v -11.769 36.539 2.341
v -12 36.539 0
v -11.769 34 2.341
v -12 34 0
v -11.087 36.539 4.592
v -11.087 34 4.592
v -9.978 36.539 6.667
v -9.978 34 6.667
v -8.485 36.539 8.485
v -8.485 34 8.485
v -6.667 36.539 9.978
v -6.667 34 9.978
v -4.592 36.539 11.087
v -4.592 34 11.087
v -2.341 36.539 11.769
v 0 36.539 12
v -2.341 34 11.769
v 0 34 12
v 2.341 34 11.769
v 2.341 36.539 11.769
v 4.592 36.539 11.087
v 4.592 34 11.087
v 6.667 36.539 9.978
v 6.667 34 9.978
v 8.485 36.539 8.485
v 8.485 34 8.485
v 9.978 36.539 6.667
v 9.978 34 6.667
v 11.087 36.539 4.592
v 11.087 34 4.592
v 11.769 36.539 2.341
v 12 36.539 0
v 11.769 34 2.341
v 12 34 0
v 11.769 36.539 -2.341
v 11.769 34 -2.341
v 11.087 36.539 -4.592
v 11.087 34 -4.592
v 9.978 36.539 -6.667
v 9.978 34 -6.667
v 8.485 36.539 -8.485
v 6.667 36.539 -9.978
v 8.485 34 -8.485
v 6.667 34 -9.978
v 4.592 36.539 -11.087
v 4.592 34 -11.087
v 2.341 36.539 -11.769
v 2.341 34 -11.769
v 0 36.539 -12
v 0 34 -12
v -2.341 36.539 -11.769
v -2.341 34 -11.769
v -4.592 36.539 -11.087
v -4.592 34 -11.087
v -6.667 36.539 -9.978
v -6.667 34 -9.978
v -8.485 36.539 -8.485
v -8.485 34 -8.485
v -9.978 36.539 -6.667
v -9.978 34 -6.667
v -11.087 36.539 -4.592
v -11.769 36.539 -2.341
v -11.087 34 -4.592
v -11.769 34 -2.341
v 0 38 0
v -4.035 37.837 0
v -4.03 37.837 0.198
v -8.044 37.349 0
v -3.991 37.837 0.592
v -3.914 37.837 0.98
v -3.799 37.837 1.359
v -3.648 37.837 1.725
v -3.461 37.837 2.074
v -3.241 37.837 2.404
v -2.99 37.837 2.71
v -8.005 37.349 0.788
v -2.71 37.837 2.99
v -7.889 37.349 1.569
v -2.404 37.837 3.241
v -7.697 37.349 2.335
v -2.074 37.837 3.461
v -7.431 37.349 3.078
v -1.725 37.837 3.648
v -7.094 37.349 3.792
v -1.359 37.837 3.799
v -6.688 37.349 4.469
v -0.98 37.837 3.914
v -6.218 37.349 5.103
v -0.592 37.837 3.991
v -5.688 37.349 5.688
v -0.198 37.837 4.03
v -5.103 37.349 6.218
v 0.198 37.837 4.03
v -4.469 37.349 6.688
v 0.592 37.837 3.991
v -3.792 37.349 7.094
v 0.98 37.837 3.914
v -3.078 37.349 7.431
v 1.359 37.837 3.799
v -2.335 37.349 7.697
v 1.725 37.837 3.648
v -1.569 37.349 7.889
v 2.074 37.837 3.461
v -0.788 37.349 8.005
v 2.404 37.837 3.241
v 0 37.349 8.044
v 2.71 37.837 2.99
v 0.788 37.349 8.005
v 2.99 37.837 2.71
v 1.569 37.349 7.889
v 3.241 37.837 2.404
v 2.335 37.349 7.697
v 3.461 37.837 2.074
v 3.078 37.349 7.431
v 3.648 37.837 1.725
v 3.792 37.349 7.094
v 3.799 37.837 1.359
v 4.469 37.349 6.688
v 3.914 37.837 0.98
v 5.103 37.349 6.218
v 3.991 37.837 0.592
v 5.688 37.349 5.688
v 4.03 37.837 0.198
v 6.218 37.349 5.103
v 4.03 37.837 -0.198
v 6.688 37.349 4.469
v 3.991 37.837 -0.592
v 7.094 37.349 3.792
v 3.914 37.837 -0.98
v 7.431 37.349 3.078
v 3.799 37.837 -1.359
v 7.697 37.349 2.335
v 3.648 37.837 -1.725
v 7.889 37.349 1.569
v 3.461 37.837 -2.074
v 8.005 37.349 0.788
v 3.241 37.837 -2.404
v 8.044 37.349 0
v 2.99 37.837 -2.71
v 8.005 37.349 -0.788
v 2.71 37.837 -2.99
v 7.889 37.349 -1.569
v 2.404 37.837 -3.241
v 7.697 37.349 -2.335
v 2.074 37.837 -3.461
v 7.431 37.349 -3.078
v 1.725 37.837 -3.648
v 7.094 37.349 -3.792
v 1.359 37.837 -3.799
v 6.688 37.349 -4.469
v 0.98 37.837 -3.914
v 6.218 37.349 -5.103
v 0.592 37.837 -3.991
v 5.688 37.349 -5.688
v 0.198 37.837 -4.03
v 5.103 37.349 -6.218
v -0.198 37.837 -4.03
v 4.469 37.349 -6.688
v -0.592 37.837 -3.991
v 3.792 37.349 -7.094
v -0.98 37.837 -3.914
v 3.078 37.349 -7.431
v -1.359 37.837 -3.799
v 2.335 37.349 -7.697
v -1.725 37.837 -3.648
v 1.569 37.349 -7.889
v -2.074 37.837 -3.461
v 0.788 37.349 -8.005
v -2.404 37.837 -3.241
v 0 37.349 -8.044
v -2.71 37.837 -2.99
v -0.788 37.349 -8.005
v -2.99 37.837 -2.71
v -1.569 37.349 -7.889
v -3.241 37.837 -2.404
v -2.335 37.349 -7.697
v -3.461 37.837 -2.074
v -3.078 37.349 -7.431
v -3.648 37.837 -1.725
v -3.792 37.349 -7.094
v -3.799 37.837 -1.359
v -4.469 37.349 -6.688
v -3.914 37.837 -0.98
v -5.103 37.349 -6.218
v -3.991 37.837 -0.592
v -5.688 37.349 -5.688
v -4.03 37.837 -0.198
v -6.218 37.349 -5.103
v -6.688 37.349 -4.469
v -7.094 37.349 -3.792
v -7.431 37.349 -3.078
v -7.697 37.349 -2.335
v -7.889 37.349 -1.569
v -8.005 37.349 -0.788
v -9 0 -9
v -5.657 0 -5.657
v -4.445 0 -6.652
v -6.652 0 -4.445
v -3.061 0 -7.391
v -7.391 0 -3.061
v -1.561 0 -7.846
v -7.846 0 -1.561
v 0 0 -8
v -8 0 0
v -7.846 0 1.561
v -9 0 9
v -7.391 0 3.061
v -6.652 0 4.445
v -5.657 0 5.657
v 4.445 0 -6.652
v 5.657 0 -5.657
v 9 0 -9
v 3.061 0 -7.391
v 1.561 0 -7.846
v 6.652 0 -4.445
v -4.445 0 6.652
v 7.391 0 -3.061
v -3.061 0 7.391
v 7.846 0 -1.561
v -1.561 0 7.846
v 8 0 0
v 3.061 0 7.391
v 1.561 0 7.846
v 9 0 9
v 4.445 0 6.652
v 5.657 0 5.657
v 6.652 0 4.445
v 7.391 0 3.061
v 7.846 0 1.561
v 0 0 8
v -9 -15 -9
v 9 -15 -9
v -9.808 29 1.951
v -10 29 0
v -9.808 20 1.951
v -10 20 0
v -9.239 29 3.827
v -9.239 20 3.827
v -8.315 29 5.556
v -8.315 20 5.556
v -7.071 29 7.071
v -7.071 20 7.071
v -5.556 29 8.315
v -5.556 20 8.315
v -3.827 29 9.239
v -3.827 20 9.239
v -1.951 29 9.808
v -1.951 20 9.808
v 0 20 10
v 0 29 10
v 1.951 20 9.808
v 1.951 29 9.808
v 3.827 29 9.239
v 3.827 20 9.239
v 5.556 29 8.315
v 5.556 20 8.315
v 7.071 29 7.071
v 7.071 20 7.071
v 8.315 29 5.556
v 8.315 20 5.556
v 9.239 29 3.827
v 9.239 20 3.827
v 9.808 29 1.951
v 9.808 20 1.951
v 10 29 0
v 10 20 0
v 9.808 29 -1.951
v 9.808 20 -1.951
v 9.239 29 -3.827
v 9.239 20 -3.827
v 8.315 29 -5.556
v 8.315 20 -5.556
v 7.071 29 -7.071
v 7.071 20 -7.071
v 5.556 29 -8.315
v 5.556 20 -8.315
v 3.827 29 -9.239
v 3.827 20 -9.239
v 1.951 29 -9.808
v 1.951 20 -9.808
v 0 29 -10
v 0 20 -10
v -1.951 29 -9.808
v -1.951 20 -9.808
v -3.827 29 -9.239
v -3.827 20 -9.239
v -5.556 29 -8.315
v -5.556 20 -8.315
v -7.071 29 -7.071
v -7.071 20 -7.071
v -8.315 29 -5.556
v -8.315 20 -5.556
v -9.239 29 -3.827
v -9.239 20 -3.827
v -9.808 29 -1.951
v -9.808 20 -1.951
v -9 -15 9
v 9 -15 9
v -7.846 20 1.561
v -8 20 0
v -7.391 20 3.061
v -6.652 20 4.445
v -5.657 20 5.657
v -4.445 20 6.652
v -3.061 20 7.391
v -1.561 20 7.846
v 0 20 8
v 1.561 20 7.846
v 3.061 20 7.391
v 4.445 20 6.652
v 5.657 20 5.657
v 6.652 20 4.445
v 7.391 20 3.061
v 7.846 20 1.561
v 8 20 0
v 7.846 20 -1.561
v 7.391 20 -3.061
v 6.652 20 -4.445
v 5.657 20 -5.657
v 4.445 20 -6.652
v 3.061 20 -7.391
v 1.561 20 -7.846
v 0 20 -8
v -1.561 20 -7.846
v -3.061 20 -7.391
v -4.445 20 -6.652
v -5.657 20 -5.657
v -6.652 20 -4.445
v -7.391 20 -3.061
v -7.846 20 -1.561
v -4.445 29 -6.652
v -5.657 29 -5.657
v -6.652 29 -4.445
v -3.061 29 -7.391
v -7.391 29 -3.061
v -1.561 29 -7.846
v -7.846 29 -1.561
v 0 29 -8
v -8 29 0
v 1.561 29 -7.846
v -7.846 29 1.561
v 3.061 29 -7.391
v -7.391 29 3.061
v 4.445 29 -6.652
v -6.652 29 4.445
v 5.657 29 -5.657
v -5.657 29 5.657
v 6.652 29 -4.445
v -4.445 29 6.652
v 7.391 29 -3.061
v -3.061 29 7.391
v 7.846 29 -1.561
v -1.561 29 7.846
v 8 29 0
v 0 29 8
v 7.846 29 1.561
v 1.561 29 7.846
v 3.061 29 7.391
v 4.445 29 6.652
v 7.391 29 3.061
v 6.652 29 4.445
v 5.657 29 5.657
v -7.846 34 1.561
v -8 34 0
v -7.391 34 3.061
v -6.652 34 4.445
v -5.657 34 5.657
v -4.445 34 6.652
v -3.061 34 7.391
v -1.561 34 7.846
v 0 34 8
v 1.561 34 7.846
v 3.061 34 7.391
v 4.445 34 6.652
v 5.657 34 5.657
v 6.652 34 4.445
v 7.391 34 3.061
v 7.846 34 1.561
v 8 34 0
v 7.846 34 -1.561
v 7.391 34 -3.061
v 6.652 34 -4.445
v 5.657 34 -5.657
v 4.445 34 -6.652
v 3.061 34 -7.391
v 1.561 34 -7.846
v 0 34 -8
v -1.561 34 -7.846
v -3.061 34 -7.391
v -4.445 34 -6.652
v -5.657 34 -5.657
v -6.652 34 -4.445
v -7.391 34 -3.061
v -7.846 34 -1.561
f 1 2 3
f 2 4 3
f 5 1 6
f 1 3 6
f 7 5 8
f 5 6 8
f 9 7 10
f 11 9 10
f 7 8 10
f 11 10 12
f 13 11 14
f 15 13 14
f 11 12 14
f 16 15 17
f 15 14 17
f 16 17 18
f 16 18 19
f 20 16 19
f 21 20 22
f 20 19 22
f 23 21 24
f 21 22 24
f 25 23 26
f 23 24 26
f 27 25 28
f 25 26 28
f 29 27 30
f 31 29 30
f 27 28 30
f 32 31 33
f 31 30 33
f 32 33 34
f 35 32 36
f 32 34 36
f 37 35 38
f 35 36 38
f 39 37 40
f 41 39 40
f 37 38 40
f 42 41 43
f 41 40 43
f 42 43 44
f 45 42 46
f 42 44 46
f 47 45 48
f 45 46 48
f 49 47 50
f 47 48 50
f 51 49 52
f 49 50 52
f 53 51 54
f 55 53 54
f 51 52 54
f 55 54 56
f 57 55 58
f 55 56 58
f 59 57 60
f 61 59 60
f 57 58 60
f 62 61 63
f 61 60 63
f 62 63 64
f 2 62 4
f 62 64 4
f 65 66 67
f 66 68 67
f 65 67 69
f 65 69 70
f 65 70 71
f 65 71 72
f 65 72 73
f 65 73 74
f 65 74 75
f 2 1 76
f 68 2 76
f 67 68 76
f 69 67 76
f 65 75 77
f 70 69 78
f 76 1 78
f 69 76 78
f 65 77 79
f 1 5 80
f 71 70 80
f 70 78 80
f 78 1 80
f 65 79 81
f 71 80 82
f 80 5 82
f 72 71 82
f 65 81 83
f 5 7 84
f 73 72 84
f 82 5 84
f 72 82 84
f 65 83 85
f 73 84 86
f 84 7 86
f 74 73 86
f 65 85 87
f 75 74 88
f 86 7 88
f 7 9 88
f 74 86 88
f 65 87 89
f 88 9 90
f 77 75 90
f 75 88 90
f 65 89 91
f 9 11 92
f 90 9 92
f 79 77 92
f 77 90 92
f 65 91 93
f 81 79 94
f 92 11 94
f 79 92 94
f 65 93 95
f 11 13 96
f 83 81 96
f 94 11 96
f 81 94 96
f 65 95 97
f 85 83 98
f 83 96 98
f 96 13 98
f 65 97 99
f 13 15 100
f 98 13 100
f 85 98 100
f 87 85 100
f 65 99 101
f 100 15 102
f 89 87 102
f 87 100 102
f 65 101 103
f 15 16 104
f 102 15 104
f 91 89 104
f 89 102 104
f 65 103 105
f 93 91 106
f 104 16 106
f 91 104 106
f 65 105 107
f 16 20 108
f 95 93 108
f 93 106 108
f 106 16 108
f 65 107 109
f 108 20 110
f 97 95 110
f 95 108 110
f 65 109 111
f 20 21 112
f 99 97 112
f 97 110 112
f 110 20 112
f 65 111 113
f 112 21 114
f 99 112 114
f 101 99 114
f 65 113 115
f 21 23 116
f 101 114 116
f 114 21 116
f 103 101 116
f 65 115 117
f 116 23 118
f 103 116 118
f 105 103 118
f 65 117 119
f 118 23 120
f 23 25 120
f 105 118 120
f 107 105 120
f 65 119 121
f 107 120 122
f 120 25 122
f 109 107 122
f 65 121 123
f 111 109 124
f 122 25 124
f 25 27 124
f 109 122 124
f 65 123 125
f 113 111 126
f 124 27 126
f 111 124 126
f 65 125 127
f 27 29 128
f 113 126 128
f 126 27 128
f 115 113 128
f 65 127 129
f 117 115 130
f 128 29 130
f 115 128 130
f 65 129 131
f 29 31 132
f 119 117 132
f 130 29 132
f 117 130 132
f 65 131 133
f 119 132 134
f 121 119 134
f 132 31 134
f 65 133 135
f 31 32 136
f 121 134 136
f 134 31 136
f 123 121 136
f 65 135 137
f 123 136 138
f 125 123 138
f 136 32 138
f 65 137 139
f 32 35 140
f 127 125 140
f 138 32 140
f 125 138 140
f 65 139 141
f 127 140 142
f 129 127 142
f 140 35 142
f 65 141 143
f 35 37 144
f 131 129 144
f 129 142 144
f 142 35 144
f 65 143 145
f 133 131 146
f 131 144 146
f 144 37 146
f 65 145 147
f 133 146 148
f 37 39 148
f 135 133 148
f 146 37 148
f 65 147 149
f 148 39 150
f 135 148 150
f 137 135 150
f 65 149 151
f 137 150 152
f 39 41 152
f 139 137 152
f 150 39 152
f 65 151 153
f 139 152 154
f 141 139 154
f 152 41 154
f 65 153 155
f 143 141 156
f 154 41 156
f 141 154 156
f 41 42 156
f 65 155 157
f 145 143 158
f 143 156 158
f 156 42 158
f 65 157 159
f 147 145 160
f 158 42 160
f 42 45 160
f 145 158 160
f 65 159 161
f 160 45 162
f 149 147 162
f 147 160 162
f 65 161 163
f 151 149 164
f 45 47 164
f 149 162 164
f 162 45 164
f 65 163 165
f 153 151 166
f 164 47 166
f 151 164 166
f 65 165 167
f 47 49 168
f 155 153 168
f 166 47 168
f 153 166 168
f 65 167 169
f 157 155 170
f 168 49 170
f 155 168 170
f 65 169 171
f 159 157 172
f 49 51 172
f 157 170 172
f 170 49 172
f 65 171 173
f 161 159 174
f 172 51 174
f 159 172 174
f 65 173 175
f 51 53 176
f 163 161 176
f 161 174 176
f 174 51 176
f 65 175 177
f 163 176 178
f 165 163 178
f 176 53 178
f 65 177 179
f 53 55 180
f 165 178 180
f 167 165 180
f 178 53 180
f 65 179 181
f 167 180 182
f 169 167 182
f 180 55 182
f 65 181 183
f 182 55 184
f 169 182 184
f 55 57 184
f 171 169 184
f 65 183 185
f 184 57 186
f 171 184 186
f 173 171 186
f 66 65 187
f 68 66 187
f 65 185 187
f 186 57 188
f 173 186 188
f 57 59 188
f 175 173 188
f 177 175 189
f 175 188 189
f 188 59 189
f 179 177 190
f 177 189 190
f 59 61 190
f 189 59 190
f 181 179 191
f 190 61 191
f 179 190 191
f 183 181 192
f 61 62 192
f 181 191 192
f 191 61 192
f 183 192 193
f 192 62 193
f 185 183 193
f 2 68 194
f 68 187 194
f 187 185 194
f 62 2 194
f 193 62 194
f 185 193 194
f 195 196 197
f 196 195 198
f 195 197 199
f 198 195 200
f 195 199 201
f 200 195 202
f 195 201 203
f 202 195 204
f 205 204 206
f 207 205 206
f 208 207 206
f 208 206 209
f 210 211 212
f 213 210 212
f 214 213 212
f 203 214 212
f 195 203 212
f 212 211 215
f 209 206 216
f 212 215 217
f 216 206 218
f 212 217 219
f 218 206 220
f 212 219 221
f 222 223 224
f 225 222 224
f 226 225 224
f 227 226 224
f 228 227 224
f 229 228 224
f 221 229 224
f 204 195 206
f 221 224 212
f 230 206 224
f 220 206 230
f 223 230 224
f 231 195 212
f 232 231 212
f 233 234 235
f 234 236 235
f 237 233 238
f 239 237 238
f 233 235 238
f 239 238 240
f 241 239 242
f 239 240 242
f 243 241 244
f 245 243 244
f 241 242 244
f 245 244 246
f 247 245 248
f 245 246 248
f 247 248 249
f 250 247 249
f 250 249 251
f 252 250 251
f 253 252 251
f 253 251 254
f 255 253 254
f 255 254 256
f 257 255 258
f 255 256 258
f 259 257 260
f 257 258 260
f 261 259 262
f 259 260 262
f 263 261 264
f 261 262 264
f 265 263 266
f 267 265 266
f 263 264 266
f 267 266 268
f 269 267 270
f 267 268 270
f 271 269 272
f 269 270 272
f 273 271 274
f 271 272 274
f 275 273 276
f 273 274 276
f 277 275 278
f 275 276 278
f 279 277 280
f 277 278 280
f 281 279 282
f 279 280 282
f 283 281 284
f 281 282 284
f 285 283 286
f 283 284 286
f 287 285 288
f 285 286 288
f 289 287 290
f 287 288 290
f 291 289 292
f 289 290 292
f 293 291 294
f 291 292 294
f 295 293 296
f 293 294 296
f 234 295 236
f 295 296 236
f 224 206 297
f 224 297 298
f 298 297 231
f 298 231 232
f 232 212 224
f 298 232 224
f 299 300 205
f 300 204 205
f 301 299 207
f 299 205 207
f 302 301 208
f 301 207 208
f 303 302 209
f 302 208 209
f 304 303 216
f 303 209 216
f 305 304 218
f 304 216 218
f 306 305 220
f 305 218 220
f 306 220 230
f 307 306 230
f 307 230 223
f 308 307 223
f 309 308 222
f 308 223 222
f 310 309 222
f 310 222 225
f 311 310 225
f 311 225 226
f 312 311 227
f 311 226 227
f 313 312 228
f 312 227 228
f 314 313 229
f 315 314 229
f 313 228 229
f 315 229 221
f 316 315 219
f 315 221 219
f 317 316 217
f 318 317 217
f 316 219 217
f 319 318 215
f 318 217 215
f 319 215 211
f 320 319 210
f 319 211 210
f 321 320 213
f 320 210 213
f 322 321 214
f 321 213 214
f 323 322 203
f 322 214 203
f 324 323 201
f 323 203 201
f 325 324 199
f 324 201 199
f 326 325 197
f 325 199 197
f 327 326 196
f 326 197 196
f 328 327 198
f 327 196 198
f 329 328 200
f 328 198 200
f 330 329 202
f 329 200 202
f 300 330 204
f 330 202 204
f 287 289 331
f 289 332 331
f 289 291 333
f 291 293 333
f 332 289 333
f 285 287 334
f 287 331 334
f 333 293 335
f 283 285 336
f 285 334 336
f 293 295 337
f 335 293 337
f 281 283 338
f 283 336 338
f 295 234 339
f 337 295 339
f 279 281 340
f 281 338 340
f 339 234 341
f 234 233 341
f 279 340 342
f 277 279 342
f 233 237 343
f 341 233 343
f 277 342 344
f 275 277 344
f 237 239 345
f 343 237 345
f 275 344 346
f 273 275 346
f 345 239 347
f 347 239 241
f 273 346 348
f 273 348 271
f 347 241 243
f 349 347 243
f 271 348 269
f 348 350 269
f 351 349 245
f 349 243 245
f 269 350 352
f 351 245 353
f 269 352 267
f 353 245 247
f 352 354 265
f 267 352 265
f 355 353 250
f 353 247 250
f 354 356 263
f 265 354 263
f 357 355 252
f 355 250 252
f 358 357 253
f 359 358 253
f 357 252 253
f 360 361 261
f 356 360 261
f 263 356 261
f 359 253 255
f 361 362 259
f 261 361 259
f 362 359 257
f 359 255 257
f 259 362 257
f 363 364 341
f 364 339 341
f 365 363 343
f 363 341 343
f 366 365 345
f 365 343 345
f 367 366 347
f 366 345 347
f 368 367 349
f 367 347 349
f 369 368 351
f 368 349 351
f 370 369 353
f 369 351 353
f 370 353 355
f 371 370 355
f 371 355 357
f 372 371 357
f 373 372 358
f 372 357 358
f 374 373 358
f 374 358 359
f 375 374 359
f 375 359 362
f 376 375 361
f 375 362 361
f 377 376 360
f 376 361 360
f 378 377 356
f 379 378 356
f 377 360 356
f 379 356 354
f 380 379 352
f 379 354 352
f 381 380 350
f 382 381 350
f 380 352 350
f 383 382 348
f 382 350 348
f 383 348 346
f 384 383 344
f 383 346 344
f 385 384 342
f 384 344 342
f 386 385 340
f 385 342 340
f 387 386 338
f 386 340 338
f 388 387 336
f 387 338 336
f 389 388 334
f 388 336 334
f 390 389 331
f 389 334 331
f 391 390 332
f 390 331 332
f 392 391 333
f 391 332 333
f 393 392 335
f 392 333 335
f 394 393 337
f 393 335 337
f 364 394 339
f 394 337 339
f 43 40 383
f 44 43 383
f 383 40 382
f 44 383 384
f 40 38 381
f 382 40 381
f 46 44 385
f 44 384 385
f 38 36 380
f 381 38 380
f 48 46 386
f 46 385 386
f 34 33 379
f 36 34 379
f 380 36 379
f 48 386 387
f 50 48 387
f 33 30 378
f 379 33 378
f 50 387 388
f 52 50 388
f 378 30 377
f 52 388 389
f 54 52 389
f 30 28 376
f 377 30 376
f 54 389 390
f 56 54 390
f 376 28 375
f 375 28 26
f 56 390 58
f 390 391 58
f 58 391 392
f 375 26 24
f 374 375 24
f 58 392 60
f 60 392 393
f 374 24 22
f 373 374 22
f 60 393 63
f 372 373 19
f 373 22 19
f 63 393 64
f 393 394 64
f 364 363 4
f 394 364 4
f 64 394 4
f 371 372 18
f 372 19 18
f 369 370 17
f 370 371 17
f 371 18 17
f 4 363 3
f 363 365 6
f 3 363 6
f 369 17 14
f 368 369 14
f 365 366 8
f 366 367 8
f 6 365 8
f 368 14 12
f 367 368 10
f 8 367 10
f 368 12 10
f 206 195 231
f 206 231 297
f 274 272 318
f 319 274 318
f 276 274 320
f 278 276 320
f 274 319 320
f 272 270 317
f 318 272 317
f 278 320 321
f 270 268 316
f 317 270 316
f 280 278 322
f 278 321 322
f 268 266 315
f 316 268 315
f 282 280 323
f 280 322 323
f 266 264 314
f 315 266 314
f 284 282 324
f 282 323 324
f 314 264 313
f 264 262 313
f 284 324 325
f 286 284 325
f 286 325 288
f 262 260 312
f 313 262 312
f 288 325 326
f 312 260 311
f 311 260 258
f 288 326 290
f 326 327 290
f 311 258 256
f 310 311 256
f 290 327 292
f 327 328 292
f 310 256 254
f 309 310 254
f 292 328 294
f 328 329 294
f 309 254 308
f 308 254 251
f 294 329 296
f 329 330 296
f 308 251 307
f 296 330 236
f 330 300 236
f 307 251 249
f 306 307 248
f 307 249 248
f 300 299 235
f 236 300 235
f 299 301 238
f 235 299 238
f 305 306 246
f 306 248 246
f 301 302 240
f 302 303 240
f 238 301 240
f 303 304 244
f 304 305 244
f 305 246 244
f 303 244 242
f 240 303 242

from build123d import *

# Parameters (mm, degrees)
ESQUISSE2_W      = 18
ESQUISSE2_H      = 18
EXTRUSION1_DEPTH = 15


with BuildPart() as part:
    # Esquisse1 → Révolution1 (revolve)
    with BuildSketch(Plane.XY):
        with BuildLine():
            Line((-12, 36.538644398), (-12, 34))
            Line((-12, 34), (-8, 34))
            Line((-8, 34), (-8, 29))
            Line((-8, 29), (-10, 29))
            Line((-10, 29), (-10, 20))
            Line((-10, 20), (-8, 20))
            Line((-8, 20), (-8, 0))
            Line((-8, 0), (0, 0))
            Line((0, 0), (0, 38))
            ThreePointArc((0, 38), (-6.044327096, 37.633316532), (-12, 36.538644398))
        make_face()
    revolve(axis=Axis((0, 0, 0), (0, 1, 0)))

    # Esquisse2 → Extrusion1 (add)
    with BuildSketch(Plane.XZ):
        Rectangle(ESQUISSE2_W, ESQUISSE2_H)
    extrude(amount=EXTRUSION1_DEPTH)


solid = part.part
